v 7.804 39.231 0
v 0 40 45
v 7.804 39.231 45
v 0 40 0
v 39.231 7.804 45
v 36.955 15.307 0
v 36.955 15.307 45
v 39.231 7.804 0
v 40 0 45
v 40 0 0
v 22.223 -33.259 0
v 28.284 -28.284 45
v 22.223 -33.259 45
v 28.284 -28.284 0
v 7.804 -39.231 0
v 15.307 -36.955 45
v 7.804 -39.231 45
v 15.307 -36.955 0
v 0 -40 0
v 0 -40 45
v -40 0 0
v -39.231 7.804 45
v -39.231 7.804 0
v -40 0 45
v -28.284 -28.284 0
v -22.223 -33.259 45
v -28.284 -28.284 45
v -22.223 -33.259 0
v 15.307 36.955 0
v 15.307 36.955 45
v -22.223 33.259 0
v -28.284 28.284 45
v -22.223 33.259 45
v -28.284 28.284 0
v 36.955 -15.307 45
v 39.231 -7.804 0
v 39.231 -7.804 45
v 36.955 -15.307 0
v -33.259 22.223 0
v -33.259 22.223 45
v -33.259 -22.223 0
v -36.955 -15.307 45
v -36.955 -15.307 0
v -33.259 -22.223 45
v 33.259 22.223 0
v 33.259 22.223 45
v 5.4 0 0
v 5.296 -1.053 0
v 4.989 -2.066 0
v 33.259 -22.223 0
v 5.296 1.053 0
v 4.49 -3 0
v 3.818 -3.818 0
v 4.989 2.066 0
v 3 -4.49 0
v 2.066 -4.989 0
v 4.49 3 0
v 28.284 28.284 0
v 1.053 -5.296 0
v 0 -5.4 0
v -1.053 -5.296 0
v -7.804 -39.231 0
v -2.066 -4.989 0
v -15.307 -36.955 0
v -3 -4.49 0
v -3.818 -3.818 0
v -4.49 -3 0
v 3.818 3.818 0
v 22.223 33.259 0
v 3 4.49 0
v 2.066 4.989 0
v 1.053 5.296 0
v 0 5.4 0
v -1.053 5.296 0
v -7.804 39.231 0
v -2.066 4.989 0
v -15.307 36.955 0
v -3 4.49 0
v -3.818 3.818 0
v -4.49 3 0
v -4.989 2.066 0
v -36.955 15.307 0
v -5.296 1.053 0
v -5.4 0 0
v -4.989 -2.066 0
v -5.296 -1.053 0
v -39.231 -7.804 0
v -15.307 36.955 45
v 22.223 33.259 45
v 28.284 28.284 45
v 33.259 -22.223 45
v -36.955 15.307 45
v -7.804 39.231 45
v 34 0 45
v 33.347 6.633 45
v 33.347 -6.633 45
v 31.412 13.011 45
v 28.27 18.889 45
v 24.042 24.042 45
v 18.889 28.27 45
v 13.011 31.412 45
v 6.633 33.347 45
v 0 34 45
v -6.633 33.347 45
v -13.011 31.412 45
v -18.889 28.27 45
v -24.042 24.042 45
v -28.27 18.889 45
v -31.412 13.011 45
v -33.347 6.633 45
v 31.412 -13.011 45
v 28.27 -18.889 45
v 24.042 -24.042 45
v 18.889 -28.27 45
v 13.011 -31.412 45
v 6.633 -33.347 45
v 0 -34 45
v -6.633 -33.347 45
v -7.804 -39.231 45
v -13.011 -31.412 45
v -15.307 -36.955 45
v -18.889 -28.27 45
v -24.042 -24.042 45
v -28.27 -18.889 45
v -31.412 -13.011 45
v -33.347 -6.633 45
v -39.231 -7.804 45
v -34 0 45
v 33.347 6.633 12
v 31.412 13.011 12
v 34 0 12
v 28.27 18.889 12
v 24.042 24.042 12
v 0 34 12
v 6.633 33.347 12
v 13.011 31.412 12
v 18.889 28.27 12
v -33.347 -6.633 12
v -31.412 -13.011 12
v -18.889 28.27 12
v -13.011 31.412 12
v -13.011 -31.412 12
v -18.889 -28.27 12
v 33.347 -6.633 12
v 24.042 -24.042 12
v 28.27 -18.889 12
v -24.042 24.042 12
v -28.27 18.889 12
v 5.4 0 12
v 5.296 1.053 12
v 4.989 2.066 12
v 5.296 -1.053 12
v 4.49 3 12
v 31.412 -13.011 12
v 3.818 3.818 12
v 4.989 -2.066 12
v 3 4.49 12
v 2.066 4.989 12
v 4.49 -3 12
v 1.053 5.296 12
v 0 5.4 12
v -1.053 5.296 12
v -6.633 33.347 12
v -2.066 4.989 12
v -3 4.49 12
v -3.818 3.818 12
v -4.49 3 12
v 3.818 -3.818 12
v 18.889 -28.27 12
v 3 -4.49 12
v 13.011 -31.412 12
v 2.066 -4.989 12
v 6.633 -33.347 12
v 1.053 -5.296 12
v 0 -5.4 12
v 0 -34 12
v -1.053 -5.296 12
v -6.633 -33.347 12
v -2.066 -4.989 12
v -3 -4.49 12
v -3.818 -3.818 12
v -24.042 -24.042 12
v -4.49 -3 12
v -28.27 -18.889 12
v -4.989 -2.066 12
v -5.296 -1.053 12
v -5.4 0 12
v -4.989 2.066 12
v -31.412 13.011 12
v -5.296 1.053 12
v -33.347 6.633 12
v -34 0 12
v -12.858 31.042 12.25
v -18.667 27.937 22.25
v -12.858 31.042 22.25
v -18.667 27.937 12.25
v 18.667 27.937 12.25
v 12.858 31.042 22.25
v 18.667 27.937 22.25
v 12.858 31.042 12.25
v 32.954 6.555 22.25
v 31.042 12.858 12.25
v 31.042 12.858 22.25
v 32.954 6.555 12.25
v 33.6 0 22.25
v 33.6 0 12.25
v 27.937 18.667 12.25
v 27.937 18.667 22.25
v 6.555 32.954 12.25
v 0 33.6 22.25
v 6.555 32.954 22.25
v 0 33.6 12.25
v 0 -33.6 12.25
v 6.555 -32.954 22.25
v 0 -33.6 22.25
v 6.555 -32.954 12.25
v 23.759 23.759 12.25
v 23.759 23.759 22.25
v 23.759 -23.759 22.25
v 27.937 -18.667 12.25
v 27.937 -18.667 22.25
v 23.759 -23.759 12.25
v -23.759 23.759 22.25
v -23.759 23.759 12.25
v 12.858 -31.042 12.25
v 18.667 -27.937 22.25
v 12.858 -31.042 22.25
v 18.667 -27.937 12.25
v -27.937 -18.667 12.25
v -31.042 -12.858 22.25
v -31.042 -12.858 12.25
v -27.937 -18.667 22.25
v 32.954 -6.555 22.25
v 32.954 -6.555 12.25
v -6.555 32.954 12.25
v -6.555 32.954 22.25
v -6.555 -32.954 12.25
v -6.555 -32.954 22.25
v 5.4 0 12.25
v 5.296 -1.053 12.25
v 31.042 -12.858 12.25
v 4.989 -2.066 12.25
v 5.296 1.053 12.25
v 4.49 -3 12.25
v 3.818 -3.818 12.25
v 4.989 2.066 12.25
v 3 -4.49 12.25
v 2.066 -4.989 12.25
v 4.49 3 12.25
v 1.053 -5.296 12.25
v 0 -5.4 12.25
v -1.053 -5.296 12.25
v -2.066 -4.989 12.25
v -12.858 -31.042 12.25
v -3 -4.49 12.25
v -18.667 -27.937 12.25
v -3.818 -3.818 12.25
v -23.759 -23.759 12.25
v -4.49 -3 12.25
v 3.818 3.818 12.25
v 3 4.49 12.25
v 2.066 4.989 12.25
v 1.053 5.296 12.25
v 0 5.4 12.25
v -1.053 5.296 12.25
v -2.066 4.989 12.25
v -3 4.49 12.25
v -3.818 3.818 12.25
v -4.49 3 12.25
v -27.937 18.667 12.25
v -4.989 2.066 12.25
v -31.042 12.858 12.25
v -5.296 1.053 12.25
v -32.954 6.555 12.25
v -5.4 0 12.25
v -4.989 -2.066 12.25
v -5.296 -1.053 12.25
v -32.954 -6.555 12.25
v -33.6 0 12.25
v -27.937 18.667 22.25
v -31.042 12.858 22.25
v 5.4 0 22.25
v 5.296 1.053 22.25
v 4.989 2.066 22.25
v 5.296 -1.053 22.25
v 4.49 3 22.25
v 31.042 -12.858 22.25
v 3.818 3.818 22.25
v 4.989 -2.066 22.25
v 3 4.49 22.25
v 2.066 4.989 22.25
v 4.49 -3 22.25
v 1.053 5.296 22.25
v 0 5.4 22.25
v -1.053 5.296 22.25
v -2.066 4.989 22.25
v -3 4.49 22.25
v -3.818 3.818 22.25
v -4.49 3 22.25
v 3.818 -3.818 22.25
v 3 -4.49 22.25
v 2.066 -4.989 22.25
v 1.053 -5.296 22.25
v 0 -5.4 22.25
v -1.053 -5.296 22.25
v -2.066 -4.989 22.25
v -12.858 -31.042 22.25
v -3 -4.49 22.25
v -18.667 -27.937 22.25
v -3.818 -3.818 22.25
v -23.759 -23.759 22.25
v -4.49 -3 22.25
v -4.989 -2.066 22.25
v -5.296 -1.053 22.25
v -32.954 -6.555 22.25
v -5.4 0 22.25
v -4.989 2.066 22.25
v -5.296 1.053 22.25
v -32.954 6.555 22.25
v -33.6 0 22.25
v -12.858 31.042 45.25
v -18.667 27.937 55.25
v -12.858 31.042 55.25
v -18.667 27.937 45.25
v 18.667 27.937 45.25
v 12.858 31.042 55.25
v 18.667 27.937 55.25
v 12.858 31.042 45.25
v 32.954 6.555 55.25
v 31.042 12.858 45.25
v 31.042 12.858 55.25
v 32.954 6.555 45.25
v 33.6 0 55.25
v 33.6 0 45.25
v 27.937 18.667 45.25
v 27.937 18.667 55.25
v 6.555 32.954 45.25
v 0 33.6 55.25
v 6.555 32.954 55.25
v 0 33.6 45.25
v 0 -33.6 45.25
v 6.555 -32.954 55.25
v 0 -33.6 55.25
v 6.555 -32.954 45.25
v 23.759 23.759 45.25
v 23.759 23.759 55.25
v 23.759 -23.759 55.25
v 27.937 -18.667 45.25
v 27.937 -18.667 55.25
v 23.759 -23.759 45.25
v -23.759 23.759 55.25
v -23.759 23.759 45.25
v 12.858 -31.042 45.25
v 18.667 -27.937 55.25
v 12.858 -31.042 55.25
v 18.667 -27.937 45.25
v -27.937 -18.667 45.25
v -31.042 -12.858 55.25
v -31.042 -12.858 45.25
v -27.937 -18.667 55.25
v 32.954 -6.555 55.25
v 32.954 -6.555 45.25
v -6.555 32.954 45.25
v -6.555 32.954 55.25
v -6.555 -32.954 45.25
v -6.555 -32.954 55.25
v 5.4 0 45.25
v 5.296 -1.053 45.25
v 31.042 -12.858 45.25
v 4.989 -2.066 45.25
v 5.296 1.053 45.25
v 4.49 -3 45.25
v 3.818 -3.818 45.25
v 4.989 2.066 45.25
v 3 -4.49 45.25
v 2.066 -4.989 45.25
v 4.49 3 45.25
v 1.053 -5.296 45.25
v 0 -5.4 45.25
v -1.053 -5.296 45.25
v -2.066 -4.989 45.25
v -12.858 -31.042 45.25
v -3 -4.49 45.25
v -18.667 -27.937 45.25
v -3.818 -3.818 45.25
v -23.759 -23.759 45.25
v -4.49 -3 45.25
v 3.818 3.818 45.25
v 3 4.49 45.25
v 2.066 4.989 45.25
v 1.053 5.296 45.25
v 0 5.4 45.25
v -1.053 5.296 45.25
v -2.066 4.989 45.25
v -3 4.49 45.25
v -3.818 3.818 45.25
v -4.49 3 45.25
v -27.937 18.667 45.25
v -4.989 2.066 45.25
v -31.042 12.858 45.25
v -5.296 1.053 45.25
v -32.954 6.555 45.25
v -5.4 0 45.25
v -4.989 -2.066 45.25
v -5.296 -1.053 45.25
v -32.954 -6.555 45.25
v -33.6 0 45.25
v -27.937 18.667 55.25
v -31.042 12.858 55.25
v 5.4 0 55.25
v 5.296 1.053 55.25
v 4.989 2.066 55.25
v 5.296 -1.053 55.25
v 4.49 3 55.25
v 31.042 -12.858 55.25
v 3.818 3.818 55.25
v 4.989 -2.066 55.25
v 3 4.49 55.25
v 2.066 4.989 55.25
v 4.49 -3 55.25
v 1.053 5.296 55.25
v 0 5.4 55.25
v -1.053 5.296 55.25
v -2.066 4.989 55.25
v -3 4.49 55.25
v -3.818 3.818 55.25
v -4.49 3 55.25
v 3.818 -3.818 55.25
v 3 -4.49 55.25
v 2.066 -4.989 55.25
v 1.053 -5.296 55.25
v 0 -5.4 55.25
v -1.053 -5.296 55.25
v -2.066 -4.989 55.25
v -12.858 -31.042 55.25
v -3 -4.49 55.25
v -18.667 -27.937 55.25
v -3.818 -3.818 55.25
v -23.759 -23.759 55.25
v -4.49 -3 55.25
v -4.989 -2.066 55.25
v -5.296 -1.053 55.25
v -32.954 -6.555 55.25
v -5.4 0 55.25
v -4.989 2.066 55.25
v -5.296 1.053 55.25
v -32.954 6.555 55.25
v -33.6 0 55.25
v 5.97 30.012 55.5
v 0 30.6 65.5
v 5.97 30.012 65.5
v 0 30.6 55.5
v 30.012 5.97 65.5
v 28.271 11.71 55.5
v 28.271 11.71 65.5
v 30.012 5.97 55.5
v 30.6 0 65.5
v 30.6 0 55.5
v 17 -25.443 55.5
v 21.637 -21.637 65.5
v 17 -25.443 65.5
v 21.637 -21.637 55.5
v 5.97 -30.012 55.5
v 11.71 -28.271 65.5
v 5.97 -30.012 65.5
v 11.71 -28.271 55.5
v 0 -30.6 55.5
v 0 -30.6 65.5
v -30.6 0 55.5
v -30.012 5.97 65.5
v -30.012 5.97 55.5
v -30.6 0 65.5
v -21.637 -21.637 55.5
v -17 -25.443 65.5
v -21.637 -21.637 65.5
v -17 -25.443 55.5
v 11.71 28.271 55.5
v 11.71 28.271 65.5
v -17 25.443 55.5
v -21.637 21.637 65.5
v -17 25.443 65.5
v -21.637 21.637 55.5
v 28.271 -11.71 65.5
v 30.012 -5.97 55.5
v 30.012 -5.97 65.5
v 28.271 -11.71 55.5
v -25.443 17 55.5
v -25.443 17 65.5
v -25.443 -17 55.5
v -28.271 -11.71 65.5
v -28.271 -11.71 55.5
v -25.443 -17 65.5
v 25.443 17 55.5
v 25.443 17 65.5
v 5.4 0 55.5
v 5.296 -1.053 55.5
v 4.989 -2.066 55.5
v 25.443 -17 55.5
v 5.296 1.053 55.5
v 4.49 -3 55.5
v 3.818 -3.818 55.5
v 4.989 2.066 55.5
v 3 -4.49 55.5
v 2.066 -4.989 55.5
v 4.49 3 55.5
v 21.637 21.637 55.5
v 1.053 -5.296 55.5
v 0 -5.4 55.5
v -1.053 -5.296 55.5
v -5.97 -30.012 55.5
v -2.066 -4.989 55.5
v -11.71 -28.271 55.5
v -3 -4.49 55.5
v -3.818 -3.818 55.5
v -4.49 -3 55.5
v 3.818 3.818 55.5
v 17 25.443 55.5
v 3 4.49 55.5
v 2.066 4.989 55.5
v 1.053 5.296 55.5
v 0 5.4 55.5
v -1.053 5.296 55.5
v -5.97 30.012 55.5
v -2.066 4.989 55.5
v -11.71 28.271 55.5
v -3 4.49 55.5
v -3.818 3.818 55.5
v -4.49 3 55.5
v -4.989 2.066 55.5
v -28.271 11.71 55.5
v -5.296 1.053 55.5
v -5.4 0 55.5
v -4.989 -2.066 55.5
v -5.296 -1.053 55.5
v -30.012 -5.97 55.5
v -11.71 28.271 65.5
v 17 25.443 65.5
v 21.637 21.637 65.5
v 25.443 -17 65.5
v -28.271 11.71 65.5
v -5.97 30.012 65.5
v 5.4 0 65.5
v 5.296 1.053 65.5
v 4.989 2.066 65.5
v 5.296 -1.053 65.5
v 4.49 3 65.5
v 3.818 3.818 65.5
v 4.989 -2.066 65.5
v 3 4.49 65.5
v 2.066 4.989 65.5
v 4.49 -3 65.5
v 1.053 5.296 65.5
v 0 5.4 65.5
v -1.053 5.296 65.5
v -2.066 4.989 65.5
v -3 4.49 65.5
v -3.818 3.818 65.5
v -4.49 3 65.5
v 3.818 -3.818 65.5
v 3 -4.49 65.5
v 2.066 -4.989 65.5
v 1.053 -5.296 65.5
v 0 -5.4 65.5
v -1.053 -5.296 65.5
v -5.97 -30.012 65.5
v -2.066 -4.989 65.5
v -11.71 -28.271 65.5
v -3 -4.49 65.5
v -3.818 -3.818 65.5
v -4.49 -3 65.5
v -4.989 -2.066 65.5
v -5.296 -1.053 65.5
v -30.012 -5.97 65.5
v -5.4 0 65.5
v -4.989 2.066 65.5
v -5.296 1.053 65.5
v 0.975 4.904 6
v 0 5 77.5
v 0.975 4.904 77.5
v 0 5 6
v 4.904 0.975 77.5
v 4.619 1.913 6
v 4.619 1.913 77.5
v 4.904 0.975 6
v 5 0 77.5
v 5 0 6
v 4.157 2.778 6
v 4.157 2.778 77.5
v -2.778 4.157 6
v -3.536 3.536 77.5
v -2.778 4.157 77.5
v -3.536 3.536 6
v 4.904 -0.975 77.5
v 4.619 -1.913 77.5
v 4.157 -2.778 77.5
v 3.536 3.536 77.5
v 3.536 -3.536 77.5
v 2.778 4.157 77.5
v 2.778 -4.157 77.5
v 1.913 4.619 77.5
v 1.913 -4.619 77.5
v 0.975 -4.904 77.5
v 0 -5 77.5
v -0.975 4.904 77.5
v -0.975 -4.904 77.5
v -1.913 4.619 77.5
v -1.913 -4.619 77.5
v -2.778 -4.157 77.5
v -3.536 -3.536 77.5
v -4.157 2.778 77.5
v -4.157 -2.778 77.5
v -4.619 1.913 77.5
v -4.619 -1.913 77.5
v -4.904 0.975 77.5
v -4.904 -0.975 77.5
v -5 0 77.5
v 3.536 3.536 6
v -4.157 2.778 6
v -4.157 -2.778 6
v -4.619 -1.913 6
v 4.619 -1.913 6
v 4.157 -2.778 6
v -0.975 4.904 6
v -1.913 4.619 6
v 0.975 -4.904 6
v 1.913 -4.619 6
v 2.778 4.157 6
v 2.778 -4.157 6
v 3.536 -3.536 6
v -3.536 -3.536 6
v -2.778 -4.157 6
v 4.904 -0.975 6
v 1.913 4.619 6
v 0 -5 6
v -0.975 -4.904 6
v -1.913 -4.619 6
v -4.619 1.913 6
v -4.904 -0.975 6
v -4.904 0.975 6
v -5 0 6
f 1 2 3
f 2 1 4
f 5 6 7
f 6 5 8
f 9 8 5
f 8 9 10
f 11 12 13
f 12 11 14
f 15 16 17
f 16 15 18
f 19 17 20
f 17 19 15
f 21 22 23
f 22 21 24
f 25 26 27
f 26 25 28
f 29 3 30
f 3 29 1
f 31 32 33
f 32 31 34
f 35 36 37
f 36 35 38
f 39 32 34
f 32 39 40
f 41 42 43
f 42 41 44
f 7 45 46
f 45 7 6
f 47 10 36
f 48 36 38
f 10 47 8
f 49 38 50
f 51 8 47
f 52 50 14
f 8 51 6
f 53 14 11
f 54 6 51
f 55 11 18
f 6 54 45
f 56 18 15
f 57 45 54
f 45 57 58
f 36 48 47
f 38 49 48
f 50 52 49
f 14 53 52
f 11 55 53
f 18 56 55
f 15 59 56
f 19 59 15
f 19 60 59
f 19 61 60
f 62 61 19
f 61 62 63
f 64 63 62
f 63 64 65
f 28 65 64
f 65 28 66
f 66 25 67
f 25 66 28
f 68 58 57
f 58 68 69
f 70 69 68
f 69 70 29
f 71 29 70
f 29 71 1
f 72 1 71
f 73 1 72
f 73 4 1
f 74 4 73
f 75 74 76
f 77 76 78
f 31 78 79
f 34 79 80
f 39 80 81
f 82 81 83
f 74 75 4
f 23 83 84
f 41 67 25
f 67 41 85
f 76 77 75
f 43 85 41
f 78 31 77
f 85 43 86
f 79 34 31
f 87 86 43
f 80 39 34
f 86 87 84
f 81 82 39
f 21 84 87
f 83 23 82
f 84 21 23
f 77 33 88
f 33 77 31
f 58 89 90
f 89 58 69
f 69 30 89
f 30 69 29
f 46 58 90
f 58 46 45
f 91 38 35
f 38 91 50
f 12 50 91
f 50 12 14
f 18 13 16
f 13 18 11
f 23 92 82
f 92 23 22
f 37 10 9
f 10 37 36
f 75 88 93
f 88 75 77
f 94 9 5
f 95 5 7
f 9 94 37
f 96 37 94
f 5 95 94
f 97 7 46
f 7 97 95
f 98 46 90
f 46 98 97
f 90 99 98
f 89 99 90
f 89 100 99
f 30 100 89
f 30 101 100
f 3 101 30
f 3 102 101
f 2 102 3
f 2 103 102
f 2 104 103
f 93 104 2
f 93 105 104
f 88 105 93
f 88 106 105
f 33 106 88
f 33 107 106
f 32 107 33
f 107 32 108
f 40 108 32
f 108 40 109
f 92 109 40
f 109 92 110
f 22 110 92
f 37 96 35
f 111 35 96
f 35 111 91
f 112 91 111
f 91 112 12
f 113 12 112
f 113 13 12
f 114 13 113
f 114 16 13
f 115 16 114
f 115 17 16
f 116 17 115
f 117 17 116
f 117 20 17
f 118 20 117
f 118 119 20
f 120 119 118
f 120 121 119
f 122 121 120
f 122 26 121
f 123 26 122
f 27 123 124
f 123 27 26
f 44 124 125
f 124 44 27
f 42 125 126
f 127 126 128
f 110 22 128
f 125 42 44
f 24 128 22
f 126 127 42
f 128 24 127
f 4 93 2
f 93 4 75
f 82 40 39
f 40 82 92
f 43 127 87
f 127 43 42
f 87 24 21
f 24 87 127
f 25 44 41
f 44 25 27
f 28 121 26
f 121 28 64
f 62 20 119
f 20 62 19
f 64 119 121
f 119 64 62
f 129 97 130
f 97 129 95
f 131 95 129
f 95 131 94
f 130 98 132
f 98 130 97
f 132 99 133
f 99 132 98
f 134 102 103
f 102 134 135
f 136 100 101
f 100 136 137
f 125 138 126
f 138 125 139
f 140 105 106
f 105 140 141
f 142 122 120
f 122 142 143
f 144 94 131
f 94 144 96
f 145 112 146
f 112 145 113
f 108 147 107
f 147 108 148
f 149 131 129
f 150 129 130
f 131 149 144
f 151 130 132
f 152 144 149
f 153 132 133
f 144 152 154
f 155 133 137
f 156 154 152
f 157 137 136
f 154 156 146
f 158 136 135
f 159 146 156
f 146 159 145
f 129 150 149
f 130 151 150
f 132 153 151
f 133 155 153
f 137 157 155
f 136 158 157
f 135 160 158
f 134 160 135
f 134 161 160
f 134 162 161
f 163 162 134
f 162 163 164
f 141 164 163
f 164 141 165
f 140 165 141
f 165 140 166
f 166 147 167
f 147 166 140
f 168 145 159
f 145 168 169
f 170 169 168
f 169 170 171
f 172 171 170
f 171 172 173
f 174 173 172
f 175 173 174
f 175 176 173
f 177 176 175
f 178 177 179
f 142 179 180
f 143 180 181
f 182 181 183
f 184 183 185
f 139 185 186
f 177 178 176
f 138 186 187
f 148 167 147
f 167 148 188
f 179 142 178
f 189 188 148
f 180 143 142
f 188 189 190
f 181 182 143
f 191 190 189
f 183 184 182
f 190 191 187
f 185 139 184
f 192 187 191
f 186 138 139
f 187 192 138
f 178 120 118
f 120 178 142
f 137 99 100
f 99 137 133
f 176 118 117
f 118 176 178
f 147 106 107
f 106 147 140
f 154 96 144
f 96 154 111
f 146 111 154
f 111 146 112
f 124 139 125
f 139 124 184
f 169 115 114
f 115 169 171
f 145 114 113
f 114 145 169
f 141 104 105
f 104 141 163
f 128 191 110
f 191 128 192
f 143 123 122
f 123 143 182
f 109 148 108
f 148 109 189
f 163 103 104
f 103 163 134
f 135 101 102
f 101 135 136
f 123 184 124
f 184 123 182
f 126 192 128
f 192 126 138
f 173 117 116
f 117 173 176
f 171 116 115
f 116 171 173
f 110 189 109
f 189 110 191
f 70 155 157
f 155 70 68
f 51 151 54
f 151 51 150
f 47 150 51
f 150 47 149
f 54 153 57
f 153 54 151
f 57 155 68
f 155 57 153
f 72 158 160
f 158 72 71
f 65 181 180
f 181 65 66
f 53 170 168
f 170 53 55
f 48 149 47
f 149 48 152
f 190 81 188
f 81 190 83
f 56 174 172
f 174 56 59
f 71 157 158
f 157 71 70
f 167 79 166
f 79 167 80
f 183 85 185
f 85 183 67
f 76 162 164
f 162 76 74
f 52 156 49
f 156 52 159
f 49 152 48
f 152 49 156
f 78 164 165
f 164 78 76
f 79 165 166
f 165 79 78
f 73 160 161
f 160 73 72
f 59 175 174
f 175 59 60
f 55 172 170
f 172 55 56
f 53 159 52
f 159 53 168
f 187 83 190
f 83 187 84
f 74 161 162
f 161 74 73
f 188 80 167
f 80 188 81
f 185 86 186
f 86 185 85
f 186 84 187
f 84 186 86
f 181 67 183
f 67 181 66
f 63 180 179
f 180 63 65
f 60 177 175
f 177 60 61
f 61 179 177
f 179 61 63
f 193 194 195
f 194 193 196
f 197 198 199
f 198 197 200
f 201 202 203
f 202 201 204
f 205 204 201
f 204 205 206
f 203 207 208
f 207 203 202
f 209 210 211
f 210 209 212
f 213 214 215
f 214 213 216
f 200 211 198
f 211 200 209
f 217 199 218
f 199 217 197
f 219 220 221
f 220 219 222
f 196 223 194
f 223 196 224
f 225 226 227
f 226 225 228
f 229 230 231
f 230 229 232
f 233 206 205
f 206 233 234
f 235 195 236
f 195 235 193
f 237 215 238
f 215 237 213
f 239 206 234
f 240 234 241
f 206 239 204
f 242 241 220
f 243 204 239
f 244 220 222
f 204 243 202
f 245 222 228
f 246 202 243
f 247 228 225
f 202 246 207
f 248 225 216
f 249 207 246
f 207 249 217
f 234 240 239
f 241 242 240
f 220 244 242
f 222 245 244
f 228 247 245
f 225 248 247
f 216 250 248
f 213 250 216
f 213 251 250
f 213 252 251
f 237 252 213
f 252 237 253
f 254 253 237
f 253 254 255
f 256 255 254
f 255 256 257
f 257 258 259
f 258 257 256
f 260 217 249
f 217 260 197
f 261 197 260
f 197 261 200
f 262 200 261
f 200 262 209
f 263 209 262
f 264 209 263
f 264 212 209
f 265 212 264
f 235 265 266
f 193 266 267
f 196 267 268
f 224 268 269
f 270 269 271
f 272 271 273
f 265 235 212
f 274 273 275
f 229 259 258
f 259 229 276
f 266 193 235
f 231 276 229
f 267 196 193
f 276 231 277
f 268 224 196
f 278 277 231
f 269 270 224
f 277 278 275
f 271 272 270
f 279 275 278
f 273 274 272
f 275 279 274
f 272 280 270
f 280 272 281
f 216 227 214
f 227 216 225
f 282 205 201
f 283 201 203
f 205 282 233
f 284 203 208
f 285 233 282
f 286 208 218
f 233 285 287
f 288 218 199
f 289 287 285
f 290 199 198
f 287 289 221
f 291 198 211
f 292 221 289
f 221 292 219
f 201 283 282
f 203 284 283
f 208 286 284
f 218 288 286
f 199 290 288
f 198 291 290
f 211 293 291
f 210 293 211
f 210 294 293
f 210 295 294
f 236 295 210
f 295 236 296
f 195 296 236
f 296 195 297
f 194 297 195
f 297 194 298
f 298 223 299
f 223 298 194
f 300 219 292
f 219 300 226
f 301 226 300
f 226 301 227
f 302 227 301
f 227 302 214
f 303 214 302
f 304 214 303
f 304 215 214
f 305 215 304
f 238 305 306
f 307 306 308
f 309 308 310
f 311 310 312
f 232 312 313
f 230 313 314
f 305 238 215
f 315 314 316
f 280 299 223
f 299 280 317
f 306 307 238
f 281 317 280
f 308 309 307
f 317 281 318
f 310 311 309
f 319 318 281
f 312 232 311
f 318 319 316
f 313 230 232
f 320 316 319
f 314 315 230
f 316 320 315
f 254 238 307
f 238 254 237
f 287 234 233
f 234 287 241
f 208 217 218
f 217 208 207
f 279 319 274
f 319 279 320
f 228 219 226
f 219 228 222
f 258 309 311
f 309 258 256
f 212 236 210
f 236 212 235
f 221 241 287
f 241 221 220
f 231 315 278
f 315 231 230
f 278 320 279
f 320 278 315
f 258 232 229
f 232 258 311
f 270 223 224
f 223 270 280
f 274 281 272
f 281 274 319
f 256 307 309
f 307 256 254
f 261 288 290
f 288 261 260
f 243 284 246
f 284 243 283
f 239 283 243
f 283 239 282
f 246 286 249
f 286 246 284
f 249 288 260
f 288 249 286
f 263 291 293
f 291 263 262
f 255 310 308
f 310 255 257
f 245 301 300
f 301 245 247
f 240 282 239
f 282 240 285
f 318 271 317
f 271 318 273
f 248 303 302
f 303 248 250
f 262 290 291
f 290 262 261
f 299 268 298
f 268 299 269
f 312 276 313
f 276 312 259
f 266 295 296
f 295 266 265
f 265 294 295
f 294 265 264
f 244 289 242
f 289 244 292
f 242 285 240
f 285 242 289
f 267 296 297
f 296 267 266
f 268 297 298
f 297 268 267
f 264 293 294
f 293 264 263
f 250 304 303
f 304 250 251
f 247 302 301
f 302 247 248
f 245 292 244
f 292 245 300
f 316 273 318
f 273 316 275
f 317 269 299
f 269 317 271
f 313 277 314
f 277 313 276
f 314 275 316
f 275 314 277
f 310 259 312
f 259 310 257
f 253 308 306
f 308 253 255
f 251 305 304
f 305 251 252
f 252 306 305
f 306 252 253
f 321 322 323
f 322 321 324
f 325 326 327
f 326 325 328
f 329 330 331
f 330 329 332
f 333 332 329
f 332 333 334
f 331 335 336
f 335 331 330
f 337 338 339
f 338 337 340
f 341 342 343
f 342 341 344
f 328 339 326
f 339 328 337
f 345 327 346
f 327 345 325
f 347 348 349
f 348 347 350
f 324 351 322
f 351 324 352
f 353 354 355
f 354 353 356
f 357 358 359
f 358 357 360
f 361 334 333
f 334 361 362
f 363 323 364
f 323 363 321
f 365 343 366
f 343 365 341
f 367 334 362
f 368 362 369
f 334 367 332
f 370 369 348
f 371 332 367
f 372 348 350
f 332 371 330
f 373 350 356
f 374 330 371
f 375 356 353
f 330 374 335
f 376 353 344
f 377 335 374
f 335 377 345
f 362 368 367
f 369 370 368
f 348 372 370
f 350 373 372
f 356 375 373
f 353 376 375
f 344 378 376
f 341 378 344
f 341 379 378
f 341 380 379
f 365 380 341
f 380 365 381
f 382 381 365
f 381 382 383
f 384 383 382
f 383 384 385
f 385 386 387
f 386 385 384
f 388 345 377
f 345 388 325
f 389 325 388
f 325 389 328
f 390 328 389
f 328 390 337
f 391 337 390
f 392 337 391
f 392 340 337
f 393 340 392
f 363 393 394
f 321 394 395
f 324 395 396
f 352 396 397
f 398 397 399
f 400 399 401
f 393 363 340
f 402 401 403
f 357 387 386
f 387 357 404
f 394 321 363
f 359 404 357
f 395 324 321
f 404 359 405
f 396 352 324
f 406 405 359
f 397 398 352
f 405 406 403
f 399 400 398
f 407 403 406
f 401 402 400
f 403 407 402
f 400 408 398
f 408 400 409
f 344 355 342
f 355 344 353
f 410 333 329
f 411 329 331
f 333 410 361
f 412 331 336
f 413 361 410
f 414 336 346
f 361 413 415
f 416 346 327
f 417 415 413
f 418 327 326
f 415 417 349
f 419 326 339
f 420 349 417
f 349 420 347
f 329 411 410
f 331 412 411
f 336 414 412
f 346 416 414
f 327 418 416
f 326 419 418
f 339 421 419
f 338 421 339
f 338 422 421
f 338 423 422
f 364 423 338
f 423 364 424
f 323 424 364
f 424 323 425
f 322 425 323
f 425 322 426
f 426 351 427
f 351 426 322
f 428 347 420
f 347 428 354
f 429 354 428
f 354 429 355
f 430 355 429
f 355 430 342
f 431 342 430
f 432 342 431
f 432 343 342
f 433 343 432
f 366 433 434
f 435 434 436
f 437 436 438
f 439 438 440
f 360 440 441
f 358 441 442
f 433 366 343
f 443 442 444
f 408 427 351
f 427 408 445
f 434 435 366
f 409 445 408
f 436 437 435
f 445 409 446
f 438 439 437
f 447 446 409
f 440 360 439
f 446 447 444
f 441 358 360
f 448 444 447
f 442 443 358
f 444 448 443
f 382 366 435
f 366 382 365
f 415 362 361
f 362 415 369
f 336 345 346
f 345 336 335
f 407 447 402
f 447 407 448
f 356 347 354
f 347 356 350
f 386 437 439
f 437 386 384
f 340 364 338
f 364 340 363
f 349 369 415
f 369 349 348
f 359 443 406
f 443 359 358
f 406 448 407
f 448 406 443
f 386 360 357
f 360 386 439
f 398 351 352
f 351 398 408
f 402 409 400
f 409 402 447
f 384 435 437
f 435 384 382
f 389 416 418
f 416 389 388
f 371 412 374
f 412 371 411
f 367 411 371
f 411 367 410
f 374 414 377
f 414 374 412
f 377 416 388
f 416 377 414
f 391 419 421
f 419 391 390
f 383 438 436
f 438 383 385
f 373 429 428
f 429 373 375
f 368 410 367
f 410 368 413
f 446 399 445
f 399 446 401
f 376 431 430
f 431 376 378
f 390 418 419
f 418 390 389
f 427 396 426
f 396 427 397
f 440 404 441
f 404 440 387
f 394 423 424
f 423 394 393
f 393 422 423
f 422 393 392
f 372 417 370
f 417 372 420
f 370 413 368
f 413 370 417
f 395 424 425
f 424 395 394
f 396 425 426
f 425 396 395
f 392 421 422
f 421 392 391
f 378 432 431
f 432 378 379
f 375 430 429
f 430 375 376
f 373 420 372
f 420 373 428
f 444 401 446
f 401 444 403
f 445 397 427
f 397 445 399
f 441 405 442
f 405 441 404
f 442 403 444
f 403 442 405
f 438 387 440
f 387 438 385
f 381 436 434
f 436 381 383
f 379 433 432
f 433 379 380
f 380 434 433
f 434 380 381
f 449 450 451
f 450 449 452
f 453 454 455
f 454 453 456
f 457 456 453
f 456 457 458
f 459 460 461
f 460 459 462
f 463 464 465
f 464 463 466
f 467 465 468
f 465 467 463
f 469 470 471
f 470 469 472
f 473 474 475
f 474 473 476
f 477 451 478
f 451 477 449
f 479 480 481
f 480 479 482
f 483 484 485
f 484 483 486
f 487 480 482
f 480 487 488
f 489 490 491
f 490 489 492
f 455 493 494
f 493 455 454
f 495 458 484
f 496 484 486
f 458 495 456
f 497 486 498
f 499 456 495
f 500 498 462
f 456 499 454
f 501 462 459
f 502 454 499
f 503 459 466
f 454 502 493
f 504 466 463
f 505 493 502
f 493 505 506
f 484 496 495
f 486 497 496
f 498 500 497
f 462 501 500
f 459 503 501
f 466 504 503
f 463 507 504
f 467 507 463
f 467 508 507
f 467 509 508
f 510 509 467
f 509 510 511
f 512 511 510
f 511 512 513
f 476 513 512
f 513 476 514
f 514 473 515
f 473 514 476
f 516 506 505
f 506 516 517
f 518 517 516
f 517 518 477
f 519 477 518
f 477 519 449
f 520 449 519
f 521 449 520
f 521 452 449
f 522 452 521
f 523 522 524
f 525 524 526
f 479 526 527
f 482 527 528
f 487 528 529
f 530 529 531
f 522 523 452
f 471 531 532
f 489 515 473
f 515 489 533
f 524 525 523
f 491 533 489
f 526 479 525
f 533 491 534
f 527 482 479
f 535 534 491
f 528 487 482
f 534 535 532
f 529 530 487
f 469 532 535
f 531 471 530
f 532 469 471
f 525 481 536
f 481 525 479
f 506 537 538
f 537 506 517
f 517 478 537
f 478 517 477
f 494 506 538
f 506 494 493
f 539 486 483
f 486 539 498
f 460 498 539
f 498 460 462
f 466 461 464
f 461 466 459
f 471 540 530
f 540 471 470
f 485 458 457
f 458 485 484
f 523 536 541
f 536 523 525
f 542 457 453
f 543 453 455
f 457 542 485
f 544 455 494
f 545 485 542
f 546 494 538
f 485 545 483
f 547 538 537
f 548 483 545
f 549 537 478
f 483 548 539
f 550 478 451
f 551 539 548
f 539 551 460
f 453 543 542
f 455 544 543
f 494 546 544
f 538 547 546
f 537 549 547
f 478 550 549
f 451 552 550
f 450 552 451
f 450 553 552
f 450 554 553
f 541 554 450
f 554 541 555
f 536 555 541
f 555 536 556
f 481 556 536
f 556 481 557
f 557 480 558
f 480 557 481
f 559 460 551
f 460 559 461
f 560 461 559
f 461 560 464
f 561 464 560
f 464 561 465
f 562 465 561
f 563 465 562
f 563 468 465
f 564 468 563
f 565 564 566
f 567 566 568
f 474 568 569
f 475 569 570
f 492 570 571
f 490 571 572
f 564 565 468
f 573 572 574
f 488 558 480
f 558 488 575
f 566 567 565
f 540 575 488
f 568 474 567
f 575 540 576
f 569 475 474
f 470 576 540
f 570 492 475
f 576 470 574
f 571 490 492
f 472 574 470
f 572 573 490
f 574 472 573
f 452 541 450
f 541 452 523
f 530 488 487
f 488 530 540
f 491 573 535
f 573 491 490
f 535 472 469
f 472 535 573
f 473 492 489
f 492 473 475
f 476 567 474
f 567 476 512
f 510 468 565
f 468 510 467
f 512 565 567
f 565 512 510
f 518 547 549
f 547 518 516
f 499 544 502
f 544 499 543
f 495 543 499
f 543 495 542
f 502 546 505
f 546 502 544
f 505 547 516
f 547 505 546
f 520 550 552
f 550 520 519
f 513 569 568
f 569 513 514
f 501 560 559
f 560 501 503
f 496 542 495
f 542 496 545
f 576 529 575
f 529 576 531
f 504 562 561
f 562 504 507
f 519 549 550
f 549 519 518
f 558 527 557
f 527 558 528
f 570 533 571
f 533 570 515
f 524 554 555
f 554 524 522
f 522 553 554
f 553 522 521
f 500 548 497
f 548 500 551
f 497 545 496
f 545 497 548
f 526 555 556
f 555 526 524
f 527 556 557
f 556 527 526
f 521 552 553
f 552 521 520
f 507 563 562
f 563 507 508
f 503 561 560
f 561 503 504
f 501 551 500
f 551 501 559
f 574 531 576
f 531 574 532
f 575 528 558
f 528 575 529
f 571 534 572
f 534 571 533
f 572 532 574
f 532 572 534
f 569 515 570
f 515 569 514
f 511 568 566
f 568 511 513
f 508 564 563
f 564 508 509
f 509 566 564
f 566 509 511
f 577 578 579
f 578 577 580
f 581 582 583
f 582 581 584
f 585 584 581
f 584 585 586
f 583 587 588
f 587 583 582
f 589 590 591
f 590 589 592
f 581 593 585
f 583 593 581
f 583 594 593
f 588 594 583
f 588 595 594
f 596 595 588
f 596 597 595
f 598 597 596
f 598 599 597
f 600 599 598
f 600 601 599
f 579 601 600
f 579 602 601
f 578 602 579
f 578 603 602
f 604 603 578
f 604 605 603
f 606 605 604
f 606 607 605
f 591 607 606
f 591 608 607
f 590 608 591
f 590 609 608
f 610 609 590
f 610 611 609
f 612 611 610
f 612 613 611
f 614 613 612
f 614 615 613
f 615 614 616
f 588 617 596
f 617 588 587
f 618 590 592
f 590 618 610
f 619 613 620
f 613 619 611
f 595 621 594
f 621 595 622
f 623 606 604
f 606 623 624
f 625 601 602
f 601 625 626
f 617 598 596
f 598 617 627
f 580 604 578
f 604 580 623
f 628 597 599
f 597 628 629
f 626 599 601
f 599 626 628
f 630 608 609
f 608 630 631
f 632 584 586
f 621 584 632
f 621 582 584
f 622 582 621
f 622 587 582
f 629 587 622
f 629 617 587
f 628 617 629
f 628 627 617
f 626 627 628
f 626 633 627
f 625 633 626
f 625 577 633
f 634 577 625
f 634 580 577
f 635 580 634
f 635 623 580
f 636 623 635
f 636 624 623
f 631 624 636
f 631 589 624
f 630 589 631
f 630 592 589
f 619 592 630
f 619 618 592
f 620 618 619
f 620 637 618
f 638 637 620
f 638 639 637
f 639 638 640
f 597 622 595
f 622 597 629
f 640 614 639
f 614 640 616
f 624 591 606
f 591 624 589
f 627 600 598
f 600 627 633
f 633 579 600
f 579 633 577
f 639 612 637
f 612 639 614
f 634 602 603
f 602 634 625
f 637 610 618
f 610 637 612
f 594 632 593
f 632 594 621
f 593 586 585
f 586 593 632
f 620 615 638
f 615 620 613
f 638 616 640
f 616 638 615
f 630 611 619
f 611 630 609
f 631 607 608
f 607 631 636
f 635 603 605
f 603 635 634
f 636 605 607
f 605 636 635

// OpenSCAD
$fn = 32;

// ------------------------------------------------------------------------
// Bearing housing: housing d80, two bearings and a shaft
// Every part is its own module, assembly() places them once.
// ------------------------------------------------------------------------

// --- part 1 ---
module housing() {
  difference() {
    cylinder(h = 45, d = 80);
    translate([0, 0, 12]) cylinder(h = 34, d = 68);
    translate([0, 0, -1]) cylinder(h = 14, d = 10.8);
  }
}

// --- part 2 ---
module bearing_lower() {
  difference() {
      translate([0, 0, 0]) cylinder(h = 10, d = 67.2);
      translate([0, 0, -1]) cylinder(h = 12, d = 10.8);
    }
}

// --- part 3 ---
module bearing_upper() {
  difference() {
      translate([0, 0, 0]) cylinder(h = 10, d = 67.2);
      translate([0, 0, -1]) cylinder(h = 12, d = 10.8);
    }
}

// --- part 4 ---
module spacer() {
  difference() {
      translate([0, 0, 0]) cylinder(h = 10, d = 61.2);
      translate([0, 0, -1]) cylinder(h = 12, d = 10.8);
    }
}

// --- part 5 ---
module shaft() {
  translate([0, 0, -35.75]) cylinder(h = 71.5, d = 10);
}

// --- assembly ---
module assembly() {
  translate([0, 0, 0]) rotate([0, 0, 0]) housing();
  translate([0, 0, 12.25]) rotate([0, 0, 0]) bearing_lower();
  translate([0, 0, 45.25]) rotate([0, 0, 0]) bearing_upper();
  translate([0, 0, 55.5]) rotate([0, 0, 0]) spacer();
  translate([0, 0, 41.75]) rotate([0, 0, 0]) shaft();
}

assembly();
